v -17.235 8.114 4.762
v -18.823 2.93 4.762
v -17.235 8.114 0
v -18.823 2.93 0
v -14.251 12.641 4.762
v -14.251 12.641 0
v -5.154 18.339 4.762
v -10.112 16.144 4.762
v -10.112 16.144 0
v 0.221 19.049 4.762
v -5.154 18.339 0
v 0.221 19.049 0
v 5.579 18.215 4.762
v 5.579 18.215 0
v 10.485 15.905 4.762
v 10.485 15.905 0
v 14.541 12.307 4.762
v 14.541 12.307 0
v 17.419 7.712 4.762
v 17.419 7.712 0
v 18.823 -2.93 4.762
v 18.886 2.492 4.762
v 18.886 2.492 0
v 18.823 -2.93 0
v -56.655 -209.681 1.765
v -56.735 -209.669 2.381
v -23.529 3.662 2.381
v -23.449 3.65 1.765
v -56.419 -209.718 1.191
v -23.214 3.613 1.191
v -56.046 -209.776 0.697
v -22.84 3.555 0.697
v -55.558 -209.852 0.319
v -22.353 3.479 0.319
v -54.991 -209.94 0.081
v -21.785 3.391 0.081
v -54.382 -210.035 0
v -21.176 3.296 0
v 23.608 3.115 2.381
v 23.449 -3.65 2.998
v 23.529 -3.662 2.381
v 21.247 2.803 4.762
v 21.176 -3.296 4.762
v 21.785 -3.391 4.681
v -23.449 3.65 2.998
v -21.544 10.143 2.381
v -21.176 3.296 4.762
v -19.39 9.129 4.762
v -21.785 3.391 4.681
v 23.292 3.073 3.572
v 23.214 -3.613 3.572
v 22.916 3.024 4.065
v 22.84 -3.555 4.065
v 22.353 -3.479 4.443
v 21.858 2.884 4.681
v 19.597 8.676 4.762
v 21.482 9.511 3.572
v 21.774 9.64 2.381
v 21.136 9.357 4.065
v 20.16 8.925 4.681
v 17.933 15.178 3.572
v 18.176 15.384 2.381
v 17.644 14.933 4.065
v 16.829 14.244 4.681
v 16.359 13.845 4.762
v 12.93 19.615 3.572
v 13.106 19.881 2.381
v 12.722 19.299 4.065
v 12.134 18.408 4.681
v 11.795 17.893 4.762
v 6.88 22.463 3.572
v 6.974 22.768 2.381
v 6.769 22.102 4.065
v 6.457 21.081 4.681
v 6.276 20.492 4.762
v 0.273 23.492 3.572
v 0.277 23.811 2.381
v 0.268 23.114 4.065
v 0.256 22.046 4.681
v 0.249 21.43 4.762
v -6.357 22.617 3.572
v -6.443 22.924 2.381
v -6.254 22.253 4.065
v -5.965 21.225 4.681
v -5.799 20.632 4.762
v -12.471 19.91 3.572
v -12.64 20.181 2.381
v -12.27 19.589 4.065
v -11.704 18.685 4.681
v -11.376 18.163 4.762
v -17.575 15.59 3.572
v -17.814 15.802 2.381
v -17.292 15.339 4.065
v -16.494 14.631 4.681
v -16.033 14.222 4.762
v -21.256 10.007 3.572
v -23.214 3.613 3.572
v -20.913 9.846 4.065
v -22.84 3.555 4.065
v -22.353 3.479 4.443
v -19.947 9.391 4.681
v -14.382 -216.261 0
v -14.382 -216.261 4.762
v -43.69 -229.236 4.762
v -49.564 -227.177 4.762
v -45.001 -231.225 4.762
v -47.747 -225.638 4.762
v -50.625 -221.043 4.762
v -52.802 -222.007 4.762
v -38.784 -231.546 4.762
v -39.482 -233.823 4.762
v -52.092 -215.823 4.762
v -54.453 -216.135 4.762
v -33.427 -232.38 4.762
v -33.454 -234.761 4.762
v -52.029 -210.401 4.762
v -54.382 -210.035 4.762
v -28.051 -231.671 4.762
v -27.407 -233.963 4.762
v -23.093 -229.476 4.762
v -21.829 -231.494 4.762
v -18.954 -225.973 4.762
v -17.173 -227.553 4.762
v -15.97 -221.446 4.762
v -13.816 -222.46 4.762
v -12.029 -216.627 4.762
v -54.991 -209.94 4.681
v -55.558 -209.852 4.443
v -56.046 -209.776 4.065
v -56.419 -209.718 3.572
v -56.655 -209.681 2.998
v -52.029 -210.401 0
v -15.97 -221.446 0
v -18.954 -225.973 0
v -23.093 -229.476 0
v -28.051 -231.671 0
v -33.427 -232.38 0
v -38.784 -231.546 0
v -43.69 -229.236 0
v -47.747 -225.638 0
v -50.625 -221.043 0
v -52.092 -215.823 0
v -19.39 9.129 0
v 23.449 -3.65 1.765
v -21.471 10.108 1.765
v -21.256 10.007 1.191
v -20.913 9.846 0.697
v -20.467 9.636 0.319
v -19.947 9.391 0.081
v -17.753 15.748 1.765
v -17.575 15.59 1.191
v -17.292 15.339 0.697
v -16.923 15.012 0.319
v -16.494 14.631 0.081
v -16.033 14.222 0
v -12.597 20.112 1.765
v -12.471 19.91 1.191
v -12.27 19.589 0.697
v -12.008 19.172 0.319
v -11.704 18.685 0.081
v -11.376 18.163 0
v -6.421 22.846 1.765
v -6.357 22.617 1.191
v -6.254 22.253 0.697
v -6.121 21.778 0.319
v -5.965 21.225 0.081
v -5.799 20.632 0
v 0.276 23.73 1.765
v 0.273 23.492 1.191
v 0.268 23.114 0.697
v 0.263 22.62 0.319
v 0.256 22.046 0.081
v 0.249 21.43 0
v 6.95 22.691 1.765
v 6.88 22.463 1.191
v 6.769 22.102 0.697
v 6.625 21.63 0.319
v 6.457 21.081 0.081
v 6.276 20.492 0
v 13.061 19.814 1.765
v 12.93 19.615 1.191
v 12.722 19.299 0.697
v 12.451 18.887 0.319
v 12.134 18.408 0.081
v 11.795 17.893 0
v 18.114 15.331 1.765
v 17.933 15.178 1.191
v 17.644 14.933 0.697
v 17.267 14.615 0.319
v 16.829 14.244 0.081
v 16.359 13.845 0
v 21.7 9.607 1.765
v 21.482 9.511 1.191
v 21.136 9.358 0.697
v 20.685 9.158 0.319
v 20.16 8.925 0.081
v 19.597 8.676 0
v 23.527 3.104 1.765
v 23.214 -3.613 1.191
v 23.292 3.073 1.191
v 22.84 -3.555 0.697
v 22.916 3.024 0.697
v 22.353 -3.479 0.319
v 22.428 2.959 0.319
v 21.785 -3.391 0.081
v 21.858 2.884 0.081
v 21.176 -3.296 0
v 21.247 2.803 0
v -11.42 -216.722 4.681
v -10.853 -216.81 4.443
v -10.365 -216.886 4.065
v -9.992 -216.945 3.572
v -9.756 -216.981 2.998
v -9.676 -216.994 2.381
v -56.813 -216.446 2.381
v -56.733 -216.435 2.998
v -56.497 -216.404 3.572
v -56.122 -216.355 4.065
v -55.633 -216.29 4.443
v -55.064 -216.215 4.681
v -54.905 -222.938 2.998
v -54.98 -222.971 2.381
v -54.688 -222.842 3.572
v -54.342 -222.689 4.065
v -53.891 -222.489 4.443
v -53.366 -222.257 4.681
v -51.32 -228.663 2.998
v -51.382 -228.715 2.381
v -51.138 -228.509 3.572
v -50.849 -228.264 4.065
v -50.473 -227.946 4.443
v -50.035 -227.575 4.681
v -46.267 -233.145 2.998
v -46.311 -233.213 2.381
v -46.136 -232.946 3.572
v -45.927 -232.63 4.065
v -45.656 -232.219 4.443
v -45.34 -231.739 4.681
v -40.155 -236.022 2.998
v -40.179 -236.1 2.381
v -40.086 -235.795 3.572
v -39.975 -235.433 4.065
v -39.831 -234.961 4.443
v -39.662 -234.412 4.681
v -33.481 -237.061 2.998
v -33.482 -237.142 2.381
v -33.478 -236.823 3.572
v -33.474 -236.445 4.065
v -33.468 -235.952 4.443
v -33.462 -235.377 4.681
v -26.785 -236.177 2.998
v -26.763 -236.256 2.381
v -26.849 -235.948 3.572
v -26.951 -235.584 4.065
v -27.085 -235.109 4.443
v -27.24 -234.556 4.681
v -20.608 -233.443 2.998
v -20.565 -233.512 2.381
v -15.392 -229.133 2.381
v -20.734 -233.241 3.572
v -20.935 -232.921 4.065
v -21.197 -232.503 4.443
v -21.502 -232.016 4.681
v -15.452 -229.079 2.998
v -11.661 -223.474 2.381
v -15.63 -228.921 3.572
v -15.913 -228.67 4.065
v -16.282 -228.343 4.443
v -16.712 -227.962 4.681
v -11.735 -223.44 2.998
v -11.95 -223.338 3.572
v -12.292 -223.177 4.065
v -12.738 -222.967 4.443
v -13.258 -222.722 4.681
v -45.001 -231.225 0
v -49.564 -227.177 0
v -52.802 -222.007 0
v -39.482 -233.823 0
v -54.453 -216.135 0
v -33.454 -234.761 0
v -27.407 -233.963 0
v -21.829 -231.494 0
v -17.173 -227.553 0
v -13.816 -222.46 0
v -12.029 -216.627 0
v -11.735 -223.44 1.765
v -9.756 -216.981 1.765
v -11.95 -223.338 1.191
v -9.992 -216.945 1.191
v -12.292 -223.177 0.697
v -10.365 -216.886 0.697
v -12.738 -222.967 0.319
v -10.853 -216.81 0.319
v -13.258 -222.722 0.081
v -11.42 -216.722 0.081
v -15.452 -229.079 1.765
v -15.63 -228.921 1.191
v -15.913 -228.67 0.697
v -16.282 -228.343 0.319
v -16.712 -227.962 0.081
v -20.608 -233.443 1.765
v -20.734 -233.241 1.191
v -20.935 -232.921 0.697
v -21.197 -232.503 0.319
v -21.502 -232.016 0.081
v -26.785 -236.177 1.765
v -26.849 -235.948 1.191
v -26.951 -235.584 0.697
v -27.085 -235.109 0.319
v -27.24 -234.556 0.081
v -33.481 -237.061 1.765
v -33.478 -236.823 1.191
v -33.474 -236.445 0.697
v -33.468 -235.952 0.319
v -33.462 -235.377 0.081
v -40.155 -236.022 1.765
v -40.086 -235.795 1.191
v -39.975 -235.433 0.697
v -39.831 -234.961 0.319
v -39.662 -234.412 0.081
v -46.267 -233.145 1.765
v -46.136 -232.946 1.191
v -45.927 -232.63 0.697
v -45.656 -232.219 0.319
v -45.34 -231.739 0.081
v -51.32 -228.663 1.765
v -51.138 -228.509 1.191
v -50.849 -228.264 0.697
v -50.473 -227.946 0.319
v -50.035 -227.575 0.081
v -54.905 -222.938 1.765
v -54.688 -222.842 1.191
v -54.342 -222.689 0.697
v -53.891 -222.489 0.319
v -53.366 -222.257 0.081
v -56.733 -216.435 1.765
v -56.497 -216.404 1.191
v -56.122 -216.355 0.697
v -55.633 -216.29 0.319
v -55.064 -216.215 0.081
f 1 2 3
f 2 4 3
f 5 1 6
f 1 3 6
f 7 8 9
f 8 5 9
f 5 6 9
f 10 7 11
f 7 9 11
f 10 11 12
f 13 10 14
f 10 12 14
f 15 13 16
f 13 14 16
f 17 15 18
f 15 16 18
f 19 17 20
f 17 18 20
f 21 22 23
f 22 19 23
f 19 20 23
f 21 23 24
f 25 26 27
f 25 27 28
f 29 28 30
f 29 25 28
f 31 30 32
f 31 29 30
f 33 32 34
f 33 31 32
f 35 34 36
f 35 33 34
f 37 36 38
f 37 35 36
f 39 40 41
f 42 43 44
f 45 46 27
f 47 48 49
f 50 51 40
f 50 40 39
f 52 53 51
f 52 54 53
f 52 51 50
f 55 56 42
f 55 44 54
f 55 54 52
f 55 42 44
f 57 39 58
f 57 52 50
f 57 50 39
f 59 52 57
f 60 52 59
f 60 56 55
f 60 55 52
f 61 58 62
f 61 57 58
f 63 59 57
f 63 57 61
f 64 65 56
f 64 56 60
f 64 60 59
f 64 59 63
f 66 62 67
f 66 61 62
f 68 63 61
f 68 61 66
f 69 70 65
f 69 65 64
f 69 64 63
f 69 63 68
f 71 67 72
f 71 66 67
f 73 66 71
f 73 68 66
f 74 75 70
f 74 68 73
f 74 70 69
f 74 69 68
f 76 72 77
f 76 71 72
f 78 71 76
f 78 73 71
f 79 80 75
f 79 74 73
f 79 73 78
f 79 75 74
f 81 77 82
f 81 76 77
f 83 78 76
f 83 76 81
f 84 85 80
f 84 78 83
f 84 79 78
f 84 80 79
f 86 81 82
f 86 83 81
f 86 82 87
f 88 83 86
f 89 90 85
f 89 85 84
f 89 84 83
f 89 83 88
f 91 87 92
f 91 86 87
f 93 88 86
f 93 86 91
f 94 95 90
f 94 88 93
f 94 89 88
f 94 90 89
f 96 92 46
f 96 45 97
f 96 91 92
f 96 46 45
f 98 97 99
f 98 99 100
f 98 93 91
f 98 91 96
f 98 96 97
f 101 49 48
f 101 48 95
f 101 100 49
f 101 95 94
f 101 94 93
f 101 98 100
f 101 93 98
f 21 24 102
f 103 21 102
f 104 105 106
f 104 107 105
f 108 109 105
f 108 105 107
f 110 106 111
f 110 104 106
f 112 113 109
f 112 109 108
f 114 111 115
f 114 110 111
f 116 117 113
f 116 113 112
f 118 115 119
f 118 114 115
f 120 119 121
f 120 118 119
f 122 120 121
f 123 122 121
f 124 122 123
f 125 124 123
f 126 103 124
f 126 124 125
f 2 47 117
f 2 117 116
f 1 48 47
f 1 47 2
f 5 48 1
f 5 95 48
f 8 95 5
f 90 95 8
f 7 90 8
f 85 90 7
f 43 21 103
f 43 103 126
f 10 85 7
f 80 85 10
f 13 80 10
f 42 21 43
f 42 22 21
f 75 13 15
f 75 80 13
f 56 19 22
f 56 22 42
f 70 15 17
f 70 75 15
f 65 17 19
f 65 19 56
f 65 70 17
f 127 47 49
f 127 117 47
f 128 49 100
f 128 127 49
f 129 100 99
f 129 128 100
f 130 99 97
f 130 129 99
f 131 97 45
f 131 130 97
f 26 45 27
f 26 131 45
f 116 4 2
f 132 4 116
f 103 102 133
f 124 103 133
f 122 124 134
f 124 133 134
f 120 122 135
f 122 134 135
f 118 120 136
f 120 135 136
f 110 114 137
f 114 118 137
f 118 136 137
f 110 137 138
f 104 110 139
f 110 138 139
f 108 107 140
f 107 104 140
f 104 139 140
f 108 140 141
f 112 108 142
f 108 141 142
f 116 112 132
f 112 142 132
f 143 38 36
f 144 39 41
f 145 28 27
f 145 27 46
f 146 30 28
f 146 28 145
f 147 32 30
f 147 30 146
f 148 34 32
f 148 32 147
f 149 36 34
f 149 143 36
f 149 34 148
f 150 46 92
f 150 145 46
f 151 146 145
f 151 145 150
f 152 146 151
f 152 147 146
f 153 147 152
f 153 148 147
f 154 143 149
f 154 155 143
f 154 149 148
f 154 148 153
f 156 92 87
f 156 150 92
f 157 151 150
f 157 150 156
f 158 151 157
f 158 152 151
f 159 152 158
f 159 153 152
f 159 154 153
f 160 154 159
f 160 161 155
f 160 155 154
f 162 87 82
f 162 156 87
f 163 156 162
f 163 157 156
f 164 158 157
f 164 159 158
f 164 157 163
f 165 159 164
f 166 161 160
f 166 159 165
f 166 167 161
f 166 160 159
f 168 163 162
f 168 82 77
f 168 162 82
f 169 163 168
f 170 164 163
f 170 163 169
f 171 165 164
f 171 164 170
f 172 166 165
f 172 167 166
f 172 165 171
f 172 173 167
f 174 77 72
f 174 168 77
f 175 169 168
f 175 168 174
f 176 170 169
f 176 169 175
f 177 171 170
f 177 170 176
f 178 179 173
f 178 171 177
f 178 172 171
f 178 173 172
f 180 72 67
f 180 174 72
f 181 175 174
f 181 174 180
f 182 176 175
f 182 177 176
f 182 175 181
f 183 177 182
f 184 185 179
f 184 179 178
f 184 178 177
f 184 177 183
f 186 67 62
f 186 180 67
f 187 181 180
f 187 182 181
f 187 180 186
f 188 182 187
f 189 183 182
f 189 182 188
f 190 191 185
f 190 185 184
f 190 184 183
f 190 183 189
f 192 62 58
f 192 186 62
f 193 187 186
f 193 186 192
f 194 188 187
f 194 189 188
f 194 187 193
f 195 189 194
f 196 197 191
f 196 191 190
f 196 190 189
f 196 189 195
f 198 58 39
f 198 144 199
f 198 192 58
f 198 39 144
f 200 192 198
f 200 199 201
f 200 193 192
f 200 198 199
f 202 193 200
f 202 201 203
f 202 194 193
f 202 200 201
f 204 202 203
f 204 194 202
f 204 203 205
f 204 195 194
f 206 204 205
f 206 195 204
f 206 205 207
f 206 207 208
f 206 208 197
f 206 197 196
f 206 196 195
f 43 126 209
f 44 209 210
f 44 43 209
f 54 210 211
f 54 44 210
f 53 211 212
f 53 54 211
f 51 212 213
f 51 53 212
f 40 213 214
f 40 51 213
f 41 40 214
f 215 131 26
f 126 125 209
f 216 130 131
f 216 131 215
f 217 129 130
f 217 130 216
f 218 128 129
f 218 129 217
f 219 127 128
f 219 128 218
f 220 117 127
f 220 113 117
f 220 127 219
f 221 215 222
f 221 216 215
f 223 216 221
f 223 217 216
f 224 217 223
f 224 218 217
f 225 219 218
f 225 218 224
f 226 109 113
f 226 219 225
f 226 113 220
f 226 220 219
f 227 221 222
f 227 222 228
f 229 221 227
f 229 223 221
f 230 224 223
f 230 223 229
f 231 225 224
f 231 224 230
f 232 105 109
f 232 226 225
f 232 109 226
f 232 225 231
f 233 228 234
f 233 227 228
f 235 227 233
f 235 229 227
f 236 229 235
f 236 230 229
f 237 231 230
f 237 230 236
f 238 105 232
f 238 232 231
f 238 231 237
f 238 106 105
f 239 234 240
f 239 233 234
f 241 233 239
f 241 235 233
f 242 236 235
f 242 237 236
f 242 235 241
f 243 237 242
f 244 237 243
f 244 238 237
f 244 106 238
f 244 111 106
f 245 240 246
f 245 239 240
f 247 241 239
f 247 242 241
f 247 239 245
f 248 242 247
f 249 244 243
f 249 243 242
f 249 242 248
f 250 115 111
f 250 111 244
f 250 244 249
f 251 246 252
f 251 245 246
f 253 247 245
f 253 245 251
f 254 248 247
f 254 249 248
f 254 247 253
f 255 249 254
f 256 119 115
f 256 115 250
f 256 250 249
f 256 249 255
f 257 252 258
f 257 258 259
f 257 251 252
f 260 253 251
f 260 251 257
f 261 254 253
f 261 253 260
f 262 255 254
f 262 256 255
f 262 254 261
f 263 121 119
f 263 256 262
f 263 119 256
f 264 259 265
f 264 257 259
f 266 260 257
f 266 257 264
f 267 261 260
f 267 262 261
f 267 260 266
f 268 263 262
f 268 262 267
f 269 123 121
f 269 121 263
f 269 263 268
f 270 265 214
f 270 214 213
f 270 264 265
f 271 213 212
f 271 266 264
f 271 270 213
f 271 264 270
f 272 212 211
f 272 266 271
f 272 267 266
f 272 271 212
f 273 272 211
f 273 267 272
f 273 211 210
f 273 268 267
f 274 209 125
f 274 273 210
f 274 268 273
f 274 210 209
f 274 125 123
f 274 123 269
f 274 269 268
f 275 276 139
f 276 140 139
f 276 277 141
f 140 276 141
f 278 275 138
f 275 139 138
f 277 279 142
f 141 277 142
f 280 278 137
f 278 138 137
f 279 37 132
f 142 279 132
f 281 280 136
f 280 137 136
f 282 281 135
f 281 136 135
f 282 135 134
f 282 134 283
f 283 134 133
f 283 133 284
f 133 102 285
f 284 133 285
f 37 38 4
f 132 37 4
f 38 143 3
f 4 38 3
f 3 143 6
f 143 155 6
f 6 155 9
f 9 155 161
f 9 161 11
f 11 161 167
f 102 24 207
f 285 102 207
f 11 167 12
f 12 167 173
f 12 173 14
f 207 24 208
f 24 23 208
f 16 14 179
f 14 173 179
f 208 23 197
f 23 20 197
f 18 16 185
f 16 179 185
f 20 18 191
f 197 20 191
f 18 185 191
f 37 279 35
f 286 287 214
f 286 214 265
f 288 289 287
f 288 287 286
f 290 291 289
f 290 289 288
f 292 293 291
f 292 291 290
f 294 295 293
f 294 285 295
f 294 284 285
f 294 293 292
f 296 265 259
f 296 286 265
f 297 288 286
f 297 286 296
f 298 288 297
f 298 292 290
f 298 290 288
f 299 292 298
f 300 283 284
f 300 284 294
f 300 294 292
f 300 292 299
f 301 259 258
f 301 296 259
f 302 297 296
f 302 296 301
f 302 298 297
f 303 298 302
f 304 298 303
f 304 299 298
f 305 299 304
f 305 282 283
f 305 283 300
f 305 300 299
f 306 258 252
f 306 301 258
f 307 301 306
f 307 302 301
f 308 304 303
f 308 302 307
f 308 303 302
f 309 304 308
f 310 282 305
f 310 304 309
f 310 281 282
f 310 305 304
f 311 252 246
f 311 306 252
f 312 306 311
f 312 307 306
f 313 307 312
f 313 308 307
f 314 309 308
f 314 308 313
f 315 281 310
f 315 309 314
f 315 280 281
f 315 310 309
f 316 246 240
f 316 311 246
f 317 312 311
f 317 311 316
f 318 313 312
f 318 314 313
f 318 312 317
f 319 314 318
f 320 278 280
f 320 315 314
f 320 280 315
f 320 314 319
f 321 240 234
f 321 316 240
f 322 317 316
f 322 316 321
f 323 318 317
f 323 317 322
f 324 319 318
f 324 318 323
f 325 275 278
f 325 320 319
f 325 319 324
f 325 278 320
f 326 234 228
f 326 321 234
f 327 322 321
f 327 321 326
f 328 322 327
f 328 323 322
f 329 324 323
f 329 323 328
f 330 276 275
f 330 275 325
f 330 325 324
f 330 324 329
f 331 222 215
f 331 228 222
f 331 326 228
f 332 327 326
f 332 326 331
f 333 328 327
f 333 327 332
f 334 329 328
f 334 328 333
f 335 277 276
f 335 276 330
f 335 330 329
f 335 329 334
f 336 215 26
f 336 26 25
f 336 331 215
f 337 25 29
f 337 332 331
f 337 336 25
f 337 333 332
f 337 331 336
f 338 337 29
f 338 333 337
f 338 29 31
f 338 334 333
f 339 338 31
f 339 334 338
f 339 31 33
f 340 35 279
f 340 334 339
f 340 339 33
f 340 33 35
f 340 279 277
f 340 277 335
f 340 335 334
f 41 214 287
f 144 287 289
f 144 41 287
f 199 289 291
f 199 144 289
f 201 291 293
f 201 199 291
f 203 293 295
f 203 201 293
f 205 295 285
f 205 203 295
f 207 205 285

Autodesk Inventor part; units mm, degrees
ref_plane "YZ Plane" through (0, 0, 0) normal (1, 0, 0) x (0, 1, 0)
ref_plane "XZ Plane" through (0, 0, 0) normal (0, 1, 0) x (-1, 0, 0)
ref_plane "XY Plane" through (0, 0, 0) normal (0, 0, 1) x (1, 0, 0)
sketch "Sketch1" plane through (0, 0, 0) normal (0, 0, 1) x (1, 0, 0)
  arc A0 (18.8233, -2.9299) -> (-18.8233, 2.9299) centre (0, 0) ccw
  arc A1 (-52.0289, -210.4013) -> (-14.3822, -216.2611) centre (-33.2055, -213.3312) ccw
  line L0 (0, 0) -> (-33.2055, -213.3312) construction
  line L1 (18.8233, -2.9299) -> (-14.3822, -216.2611)
  line L2 (-18.8233, 2.9299) -> (-52.0289, -210.4013)
  line L3 (-33.2055, -213.3312) -> (-14.3822, -216.2611) construction
  line L4 (0, 0) -> (18.8233, -2.9299) construction
  arc A2 (23.5292, -3.6624) -> (-23.5292, 3.6624) centre (0, 0) ccw
  arc A3 (-56.7347, -209.6688) -> (-9.6763, -216.9936) centre (-33.2055, -213.3312) ccw
  line L5 (-23.5292, 3.6624) -> (-56.7347, -209.6688)
  line L6 (-9.6763, -216.9936) -> (23.5292, -3.6624)
  dimension "d0" = 215.9
  dimension "d1" = 4.7625
  dimension "d2" = 19.05
extrude "Extrusion1" add sketch "Sketch1" along normal blind 4.7625
fillet "Fillet1" radius 2.3813 8 edges at (-36.8679, -236.8604, 4.7625) (-40.1319, -103.0032, 4.7625) (3.6624, 23.5292, 4.7625) (6.9264, -110.328, 4.7625) (3.6624, 23.5292, 0) (-40.1319, -103.0032, 0) (-36.8679, -236.8604, 0) (6.9264, -110.328, 0)
properties part number "Belt_VerticalConveyor_Outer"
